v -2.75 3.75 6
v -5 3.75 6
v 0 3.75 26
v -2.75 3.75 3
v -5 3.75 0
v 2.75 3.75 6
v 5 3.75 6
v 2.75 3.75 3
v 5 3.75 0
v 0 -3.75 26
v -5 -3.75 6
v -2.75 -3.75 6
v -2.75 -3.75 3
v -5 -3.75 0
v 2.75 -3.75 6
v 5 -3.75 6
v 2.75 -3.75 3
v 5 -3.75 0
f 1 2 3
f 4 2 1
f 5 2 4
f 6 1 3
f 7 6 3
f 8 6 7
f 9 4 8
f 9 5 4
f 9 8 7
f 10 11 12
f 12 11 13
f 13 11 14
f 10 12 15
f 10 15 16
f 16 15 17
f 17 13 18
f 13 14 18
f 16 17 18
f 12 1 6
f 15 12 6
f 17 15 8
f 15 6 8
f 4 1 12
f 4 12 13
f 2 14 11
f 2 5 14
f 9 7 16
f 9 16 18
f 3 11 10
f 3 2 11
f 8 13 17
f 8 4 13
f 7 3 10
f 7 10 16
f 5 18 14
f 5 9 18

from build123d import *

# Parameters (mm, degrees)
SKETCH2_W  = 5.5
SKETCH2_H  = 3
BODY_DEPTH = 3.75


with BuildPart() as part:
    # Sketch2 → Body (new, symmetric)
    with BuildSketch(Plane(origin=(0, 0, 0), x_dir=(1, 0, 0), z_dir=(0, 1, 0))):
        Polygon((-5, -6), (0, -26), (5, -6), (5, 0), (-5, 0), align=None)
        with Locations((0, -4.5)):
            Rectangle(SKETCH2_W, SKETCH2_H, mode=Mode.SUBTRACT)
    extrude(amount=BODY_DEPTH, both=True)


solid = part.part
